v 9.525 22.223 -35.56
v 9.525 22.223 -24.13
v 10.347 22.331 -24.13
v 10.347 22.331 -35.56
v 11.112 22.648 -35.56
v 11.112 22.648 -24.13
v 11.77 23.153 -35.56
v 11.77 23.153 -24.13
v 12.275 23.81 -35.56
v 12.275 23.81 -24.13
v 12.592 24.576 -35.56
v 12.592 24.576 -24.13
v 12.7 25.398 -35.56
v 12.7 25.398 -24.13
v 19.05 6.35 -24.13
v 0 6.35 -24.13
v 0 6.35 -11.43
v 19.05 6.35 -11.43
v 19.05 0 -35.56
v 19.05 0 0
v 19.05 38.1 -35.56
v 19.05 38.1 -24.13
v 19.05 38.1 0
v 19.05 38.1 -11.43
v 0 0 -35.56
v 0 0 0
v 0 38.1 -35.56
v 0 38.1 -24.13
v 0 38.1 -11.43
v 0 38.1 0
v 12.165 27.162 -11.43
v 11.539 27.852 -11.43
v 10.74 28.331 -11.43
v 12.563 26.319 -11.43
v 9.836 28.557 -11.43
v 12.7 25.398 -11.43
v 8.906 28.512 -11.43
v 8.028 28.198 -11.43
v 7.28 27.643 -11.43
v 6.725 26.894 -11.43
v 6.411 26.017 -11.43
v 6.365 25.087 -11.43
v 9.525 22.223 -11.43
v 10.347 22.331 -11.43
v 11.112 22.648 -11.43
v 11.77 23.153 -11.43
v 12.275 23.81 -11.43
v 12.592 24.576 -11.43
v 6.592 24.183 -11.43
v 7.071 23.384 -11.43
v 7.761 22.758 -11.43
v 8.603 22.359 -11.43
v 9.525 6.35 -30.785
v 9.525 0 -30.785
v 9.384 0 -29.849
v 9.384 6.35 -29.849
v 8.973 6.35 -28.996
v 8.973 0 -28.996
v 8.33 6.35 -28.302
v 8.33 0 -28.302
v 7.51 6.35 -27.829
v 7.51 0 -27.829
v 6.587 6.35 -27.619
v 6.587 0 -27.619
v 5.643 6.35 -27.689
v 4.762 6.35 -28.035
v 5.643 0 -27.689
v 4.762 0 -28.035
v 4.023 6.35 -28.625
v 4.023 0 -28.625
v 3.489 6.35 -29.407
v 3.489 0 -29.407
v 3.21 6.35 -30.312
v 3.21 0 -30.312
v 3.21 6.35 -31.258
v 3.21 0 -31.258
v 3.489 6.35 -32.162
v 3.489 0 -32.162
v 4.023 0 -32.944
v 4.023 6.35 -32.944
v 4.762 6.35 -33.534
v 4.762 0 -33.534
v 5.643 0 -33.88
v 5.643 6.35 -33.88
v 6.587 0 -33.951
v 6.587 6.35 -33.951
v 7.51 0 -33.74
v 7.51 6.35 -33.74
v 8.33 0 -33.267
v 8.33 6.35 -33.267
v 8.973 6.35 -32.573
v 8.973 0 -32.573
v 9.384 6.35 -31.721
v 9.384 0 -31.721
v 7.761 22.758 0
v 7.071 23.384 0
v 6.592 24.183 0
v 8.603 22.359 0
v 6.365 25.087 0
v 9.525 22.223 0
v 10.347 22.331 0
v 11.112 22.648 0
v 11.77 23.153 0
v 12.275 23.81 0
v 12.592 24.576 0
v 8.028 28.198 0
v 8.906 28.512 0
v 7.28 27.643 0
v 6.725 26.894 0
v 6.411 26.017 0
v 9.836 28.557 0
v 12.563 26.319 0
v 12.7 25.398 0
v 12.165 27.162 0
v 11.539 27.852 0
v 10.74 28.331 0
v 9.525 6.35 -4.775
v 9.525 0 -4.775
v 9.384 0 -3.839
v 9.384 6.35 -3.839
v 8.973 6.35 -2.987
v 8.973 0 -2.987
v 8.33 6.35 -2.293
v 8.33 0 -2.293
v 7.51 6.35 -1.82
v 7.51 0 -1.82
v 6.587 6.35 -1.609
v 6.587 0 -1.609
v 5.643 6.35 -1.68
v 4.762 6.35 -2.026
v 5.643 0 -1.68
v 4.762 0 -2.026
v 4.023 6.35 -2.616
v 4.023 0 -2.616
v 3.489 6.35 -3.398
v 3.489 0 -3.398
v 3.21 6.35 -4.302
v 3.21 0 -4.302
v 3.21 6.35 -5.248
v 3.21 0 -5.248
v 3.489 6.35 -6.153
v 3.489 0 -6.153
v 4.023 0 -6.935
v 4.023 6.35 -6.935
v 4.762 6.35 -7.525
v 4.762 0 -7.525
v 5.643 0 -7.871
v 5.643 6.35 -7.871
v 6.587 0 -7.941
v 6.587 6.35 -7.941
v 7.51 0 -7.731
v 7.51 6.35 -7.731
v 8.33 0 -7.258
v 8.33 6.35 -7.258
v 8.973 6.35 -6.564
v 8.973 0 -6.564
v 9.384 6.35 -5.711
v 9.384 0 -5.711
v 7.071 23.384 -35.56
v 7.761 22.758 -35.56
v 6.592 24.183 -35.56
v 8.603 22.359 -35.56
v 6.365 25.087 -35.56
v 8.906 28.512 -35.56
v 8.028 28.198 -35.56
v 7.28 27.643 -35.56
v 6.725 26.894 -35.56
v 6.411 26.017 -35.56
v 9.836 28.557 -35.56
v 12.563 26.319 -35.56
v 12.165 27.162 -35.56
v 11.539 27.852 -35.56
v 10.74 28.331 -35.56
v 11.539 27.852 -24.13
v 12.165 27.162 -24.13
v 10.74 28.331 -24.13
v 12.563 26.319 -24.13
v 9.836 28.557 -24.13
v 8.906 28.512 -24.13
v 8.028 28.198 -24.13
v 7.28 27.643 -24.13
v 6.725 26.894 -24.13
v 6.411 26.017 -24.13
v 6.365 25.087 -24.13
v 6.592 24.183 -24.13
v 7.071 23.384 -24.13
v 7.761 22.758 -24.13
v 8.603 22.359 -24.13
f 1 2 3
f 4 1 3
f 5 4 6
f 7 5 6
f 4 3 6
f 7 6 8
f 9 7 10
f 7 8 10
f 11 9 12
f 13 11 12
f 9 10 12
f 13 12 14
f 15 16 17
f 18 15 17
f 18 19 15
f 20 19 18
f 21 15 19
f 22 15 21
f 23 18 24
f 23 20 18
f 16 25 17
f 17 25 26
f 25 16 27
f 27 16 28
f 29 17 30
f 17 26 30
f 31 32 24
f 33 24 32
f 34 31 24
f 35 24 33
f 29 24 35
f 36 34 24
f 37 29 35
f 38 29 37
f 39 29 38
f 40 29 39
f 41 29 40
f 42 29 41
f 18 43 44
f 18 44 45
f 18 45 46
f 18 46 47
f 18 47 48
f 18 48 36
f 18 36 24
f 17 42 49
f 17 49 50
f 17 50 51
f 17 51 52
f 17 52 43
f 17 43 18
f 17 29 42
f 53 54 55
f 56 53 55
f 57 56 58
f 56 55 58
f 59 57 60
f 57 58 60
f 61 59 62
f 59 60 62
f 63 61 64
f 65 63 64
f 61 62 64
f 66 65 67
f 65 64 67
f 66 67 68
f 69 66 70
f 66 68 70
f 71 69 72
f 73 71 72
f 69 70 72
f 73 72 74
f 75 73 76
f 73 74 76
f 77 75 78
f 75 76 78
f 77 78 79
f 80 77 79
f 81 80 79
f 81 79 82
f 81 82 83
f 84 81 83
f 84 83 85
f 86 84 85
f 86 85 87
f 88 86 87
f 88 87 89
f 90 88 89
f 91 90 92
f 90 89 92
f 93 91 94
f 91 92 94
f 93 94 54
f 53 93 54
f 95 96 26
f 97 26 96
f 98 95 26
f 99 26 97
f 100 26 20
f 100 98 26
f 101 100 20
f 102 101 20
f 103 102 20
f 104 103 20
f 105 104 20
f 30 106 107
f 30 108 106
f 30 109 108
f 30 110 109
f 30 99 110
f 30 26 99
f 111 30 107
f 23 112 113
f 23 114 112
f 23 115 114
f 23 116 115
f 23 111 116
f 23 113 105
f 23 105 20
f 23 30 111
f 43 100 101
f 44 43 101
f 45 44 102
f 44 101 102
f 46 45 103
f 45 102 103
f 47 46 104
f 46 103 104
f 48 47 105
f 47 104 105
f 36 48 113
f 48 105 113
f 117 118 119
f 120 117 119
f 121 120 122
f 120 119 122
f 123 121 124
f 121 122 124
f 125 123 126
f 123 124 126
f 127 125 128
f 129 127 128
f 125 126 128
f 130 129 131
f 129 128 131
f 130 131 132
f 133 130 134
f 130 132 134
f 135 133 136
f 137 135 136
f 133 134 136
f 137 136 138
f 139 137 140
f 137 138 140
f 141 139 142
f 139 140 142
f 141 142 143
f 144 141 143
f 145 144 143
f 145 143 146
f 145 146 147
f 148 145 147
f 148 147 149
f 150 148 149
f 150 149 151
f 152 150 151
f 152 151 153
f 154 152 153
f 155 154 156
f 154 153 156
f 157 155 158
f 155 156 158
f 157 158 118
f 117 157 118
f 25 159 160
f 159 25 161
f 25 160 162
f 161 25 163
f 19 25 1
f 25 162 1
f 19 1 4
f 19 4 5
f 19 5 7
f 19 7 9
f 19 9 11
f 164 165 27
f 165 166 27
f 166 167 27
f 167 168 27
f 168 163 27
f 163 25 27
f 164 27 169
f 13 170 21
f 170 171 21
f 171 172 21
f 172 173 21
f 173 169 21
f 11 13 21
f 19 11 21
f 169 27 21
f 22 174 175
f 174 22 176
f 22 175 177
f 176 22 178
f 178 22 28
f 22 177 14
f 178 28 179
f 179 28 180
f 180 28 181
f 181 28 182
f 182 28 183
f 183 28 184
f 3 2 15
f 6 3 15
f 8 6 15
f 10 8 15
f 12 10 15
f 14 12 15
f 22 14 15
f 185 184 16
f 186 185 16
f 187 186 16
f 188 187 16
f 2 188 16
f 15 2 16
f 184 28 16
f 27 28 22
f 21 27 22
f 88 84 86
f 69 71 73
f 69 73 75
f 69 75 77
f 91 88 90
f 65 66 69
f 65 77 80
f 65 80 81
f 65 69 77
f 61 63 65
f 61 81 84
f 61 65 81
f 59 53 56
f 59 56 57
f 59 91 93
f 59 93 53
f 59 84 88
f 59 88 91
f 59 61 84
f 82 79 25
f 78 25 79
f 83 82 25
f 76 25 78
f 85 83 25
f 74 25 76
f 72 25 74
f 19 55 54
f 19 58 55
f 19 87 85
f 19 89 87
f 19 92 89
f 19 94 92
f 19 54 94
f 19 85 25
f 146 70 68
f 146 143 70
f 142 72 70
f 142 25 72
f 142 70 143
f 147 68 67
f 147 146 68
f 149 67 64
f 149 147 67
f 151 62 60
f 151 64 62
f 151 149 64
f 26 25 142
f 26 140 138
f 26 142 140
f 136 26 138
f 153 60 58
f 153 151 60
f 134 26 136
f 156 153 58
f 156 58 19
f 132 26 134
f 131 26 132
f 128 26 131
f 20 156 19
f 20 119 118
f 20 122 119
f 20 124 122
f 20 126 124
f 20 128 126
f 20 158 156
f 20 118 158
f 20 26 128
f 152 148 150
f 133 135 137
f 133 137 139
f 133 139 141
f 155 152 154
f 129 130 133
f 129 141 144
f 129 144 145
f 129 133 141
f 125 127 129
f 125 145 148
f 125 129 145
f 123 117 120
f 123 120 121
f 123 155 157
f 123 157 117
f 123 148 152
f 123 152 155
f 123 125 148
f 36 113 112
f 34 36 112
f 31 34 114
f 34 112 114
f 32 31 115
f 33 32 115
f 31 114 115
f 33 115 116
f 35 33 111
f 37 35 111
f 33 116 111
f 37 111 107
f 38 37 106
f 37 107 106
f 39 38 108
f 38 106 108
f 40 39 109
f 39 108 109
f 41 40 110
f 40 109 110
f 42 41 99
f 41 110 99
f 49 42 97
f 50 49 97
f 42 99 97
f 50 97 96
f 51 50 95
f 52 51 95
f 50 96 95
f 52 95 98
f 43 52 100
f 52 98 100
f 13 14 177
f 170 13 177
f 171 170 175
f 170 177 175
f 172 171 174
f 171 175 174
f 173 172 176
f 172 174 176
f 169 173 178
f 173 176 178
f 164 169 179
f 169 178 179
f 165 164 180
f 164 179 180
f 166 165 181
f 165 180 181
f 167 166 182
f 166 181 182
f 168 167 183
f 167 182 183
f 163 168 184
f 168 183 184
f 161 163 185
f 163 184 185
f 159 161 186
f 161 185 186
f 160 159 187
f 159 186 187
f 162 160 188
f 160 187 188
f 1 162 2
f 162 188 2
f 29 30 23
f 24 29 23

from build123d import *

# Parameters (mm, degrees)
F0_W     = 19.05
F0_H     = 38.1
F1_DEPTH = 35.56
F2_W     = 31.75
F2_H     = 12.7
F3_DEPTH = 25.4
F5_DEPTH = 35.561
F6_R     = 3.175
F7_DEPTH = 6.35


with BuildPart() as f1:
    # F0 (on Top) → F1 (new body)
    with BuildSketch(Plane.XY):
        with Locations((9.525, 19.05)):
            Rectangle(F0_W, F0_H)
    extrude(amount=-F1_DEPTH)

    # F2 (on face) → F3 (cut)
    with BuildSketch(Plane(origin=(0, 0, 0), x_dir=(0, -1, 0), z_dir=(-1, 0, 0))):
        with Locations((-22.225, -17.78)):
            Rectangle(F2_W, F2_H)
    extrude(amount=-F3_DEPTH, mode=Mode.SUBTRACT)

    # F4 (on face) → F5 (cut, through all)
    with BuildSketch(Plane.XY):
        with BuildLine():
            ThreePointArc((12.7, 25.397724), (7.279936, 27.642788), (9.525, 22.222724))
            ThreePointArc((9.525, 22.222724), (11.770064, 23.15266), (12.7, 25.397724))
        make_face()
    extrude(amount=-F5_DEPTH, mode=Mode.SUBTRACT)

    # F6 (on face) → F7 (cut)
    with BuildSketch(Plane.XZ):
        with Locations((6.35, -30.7848)):
            Circle(F6_R)
        with Locations((6.35, -4.7752)):
            Circle(F6_R)
    extrude(amount=-F7_DEPTH, mode=Mode.SUBTRACT)


solid = f1.part
